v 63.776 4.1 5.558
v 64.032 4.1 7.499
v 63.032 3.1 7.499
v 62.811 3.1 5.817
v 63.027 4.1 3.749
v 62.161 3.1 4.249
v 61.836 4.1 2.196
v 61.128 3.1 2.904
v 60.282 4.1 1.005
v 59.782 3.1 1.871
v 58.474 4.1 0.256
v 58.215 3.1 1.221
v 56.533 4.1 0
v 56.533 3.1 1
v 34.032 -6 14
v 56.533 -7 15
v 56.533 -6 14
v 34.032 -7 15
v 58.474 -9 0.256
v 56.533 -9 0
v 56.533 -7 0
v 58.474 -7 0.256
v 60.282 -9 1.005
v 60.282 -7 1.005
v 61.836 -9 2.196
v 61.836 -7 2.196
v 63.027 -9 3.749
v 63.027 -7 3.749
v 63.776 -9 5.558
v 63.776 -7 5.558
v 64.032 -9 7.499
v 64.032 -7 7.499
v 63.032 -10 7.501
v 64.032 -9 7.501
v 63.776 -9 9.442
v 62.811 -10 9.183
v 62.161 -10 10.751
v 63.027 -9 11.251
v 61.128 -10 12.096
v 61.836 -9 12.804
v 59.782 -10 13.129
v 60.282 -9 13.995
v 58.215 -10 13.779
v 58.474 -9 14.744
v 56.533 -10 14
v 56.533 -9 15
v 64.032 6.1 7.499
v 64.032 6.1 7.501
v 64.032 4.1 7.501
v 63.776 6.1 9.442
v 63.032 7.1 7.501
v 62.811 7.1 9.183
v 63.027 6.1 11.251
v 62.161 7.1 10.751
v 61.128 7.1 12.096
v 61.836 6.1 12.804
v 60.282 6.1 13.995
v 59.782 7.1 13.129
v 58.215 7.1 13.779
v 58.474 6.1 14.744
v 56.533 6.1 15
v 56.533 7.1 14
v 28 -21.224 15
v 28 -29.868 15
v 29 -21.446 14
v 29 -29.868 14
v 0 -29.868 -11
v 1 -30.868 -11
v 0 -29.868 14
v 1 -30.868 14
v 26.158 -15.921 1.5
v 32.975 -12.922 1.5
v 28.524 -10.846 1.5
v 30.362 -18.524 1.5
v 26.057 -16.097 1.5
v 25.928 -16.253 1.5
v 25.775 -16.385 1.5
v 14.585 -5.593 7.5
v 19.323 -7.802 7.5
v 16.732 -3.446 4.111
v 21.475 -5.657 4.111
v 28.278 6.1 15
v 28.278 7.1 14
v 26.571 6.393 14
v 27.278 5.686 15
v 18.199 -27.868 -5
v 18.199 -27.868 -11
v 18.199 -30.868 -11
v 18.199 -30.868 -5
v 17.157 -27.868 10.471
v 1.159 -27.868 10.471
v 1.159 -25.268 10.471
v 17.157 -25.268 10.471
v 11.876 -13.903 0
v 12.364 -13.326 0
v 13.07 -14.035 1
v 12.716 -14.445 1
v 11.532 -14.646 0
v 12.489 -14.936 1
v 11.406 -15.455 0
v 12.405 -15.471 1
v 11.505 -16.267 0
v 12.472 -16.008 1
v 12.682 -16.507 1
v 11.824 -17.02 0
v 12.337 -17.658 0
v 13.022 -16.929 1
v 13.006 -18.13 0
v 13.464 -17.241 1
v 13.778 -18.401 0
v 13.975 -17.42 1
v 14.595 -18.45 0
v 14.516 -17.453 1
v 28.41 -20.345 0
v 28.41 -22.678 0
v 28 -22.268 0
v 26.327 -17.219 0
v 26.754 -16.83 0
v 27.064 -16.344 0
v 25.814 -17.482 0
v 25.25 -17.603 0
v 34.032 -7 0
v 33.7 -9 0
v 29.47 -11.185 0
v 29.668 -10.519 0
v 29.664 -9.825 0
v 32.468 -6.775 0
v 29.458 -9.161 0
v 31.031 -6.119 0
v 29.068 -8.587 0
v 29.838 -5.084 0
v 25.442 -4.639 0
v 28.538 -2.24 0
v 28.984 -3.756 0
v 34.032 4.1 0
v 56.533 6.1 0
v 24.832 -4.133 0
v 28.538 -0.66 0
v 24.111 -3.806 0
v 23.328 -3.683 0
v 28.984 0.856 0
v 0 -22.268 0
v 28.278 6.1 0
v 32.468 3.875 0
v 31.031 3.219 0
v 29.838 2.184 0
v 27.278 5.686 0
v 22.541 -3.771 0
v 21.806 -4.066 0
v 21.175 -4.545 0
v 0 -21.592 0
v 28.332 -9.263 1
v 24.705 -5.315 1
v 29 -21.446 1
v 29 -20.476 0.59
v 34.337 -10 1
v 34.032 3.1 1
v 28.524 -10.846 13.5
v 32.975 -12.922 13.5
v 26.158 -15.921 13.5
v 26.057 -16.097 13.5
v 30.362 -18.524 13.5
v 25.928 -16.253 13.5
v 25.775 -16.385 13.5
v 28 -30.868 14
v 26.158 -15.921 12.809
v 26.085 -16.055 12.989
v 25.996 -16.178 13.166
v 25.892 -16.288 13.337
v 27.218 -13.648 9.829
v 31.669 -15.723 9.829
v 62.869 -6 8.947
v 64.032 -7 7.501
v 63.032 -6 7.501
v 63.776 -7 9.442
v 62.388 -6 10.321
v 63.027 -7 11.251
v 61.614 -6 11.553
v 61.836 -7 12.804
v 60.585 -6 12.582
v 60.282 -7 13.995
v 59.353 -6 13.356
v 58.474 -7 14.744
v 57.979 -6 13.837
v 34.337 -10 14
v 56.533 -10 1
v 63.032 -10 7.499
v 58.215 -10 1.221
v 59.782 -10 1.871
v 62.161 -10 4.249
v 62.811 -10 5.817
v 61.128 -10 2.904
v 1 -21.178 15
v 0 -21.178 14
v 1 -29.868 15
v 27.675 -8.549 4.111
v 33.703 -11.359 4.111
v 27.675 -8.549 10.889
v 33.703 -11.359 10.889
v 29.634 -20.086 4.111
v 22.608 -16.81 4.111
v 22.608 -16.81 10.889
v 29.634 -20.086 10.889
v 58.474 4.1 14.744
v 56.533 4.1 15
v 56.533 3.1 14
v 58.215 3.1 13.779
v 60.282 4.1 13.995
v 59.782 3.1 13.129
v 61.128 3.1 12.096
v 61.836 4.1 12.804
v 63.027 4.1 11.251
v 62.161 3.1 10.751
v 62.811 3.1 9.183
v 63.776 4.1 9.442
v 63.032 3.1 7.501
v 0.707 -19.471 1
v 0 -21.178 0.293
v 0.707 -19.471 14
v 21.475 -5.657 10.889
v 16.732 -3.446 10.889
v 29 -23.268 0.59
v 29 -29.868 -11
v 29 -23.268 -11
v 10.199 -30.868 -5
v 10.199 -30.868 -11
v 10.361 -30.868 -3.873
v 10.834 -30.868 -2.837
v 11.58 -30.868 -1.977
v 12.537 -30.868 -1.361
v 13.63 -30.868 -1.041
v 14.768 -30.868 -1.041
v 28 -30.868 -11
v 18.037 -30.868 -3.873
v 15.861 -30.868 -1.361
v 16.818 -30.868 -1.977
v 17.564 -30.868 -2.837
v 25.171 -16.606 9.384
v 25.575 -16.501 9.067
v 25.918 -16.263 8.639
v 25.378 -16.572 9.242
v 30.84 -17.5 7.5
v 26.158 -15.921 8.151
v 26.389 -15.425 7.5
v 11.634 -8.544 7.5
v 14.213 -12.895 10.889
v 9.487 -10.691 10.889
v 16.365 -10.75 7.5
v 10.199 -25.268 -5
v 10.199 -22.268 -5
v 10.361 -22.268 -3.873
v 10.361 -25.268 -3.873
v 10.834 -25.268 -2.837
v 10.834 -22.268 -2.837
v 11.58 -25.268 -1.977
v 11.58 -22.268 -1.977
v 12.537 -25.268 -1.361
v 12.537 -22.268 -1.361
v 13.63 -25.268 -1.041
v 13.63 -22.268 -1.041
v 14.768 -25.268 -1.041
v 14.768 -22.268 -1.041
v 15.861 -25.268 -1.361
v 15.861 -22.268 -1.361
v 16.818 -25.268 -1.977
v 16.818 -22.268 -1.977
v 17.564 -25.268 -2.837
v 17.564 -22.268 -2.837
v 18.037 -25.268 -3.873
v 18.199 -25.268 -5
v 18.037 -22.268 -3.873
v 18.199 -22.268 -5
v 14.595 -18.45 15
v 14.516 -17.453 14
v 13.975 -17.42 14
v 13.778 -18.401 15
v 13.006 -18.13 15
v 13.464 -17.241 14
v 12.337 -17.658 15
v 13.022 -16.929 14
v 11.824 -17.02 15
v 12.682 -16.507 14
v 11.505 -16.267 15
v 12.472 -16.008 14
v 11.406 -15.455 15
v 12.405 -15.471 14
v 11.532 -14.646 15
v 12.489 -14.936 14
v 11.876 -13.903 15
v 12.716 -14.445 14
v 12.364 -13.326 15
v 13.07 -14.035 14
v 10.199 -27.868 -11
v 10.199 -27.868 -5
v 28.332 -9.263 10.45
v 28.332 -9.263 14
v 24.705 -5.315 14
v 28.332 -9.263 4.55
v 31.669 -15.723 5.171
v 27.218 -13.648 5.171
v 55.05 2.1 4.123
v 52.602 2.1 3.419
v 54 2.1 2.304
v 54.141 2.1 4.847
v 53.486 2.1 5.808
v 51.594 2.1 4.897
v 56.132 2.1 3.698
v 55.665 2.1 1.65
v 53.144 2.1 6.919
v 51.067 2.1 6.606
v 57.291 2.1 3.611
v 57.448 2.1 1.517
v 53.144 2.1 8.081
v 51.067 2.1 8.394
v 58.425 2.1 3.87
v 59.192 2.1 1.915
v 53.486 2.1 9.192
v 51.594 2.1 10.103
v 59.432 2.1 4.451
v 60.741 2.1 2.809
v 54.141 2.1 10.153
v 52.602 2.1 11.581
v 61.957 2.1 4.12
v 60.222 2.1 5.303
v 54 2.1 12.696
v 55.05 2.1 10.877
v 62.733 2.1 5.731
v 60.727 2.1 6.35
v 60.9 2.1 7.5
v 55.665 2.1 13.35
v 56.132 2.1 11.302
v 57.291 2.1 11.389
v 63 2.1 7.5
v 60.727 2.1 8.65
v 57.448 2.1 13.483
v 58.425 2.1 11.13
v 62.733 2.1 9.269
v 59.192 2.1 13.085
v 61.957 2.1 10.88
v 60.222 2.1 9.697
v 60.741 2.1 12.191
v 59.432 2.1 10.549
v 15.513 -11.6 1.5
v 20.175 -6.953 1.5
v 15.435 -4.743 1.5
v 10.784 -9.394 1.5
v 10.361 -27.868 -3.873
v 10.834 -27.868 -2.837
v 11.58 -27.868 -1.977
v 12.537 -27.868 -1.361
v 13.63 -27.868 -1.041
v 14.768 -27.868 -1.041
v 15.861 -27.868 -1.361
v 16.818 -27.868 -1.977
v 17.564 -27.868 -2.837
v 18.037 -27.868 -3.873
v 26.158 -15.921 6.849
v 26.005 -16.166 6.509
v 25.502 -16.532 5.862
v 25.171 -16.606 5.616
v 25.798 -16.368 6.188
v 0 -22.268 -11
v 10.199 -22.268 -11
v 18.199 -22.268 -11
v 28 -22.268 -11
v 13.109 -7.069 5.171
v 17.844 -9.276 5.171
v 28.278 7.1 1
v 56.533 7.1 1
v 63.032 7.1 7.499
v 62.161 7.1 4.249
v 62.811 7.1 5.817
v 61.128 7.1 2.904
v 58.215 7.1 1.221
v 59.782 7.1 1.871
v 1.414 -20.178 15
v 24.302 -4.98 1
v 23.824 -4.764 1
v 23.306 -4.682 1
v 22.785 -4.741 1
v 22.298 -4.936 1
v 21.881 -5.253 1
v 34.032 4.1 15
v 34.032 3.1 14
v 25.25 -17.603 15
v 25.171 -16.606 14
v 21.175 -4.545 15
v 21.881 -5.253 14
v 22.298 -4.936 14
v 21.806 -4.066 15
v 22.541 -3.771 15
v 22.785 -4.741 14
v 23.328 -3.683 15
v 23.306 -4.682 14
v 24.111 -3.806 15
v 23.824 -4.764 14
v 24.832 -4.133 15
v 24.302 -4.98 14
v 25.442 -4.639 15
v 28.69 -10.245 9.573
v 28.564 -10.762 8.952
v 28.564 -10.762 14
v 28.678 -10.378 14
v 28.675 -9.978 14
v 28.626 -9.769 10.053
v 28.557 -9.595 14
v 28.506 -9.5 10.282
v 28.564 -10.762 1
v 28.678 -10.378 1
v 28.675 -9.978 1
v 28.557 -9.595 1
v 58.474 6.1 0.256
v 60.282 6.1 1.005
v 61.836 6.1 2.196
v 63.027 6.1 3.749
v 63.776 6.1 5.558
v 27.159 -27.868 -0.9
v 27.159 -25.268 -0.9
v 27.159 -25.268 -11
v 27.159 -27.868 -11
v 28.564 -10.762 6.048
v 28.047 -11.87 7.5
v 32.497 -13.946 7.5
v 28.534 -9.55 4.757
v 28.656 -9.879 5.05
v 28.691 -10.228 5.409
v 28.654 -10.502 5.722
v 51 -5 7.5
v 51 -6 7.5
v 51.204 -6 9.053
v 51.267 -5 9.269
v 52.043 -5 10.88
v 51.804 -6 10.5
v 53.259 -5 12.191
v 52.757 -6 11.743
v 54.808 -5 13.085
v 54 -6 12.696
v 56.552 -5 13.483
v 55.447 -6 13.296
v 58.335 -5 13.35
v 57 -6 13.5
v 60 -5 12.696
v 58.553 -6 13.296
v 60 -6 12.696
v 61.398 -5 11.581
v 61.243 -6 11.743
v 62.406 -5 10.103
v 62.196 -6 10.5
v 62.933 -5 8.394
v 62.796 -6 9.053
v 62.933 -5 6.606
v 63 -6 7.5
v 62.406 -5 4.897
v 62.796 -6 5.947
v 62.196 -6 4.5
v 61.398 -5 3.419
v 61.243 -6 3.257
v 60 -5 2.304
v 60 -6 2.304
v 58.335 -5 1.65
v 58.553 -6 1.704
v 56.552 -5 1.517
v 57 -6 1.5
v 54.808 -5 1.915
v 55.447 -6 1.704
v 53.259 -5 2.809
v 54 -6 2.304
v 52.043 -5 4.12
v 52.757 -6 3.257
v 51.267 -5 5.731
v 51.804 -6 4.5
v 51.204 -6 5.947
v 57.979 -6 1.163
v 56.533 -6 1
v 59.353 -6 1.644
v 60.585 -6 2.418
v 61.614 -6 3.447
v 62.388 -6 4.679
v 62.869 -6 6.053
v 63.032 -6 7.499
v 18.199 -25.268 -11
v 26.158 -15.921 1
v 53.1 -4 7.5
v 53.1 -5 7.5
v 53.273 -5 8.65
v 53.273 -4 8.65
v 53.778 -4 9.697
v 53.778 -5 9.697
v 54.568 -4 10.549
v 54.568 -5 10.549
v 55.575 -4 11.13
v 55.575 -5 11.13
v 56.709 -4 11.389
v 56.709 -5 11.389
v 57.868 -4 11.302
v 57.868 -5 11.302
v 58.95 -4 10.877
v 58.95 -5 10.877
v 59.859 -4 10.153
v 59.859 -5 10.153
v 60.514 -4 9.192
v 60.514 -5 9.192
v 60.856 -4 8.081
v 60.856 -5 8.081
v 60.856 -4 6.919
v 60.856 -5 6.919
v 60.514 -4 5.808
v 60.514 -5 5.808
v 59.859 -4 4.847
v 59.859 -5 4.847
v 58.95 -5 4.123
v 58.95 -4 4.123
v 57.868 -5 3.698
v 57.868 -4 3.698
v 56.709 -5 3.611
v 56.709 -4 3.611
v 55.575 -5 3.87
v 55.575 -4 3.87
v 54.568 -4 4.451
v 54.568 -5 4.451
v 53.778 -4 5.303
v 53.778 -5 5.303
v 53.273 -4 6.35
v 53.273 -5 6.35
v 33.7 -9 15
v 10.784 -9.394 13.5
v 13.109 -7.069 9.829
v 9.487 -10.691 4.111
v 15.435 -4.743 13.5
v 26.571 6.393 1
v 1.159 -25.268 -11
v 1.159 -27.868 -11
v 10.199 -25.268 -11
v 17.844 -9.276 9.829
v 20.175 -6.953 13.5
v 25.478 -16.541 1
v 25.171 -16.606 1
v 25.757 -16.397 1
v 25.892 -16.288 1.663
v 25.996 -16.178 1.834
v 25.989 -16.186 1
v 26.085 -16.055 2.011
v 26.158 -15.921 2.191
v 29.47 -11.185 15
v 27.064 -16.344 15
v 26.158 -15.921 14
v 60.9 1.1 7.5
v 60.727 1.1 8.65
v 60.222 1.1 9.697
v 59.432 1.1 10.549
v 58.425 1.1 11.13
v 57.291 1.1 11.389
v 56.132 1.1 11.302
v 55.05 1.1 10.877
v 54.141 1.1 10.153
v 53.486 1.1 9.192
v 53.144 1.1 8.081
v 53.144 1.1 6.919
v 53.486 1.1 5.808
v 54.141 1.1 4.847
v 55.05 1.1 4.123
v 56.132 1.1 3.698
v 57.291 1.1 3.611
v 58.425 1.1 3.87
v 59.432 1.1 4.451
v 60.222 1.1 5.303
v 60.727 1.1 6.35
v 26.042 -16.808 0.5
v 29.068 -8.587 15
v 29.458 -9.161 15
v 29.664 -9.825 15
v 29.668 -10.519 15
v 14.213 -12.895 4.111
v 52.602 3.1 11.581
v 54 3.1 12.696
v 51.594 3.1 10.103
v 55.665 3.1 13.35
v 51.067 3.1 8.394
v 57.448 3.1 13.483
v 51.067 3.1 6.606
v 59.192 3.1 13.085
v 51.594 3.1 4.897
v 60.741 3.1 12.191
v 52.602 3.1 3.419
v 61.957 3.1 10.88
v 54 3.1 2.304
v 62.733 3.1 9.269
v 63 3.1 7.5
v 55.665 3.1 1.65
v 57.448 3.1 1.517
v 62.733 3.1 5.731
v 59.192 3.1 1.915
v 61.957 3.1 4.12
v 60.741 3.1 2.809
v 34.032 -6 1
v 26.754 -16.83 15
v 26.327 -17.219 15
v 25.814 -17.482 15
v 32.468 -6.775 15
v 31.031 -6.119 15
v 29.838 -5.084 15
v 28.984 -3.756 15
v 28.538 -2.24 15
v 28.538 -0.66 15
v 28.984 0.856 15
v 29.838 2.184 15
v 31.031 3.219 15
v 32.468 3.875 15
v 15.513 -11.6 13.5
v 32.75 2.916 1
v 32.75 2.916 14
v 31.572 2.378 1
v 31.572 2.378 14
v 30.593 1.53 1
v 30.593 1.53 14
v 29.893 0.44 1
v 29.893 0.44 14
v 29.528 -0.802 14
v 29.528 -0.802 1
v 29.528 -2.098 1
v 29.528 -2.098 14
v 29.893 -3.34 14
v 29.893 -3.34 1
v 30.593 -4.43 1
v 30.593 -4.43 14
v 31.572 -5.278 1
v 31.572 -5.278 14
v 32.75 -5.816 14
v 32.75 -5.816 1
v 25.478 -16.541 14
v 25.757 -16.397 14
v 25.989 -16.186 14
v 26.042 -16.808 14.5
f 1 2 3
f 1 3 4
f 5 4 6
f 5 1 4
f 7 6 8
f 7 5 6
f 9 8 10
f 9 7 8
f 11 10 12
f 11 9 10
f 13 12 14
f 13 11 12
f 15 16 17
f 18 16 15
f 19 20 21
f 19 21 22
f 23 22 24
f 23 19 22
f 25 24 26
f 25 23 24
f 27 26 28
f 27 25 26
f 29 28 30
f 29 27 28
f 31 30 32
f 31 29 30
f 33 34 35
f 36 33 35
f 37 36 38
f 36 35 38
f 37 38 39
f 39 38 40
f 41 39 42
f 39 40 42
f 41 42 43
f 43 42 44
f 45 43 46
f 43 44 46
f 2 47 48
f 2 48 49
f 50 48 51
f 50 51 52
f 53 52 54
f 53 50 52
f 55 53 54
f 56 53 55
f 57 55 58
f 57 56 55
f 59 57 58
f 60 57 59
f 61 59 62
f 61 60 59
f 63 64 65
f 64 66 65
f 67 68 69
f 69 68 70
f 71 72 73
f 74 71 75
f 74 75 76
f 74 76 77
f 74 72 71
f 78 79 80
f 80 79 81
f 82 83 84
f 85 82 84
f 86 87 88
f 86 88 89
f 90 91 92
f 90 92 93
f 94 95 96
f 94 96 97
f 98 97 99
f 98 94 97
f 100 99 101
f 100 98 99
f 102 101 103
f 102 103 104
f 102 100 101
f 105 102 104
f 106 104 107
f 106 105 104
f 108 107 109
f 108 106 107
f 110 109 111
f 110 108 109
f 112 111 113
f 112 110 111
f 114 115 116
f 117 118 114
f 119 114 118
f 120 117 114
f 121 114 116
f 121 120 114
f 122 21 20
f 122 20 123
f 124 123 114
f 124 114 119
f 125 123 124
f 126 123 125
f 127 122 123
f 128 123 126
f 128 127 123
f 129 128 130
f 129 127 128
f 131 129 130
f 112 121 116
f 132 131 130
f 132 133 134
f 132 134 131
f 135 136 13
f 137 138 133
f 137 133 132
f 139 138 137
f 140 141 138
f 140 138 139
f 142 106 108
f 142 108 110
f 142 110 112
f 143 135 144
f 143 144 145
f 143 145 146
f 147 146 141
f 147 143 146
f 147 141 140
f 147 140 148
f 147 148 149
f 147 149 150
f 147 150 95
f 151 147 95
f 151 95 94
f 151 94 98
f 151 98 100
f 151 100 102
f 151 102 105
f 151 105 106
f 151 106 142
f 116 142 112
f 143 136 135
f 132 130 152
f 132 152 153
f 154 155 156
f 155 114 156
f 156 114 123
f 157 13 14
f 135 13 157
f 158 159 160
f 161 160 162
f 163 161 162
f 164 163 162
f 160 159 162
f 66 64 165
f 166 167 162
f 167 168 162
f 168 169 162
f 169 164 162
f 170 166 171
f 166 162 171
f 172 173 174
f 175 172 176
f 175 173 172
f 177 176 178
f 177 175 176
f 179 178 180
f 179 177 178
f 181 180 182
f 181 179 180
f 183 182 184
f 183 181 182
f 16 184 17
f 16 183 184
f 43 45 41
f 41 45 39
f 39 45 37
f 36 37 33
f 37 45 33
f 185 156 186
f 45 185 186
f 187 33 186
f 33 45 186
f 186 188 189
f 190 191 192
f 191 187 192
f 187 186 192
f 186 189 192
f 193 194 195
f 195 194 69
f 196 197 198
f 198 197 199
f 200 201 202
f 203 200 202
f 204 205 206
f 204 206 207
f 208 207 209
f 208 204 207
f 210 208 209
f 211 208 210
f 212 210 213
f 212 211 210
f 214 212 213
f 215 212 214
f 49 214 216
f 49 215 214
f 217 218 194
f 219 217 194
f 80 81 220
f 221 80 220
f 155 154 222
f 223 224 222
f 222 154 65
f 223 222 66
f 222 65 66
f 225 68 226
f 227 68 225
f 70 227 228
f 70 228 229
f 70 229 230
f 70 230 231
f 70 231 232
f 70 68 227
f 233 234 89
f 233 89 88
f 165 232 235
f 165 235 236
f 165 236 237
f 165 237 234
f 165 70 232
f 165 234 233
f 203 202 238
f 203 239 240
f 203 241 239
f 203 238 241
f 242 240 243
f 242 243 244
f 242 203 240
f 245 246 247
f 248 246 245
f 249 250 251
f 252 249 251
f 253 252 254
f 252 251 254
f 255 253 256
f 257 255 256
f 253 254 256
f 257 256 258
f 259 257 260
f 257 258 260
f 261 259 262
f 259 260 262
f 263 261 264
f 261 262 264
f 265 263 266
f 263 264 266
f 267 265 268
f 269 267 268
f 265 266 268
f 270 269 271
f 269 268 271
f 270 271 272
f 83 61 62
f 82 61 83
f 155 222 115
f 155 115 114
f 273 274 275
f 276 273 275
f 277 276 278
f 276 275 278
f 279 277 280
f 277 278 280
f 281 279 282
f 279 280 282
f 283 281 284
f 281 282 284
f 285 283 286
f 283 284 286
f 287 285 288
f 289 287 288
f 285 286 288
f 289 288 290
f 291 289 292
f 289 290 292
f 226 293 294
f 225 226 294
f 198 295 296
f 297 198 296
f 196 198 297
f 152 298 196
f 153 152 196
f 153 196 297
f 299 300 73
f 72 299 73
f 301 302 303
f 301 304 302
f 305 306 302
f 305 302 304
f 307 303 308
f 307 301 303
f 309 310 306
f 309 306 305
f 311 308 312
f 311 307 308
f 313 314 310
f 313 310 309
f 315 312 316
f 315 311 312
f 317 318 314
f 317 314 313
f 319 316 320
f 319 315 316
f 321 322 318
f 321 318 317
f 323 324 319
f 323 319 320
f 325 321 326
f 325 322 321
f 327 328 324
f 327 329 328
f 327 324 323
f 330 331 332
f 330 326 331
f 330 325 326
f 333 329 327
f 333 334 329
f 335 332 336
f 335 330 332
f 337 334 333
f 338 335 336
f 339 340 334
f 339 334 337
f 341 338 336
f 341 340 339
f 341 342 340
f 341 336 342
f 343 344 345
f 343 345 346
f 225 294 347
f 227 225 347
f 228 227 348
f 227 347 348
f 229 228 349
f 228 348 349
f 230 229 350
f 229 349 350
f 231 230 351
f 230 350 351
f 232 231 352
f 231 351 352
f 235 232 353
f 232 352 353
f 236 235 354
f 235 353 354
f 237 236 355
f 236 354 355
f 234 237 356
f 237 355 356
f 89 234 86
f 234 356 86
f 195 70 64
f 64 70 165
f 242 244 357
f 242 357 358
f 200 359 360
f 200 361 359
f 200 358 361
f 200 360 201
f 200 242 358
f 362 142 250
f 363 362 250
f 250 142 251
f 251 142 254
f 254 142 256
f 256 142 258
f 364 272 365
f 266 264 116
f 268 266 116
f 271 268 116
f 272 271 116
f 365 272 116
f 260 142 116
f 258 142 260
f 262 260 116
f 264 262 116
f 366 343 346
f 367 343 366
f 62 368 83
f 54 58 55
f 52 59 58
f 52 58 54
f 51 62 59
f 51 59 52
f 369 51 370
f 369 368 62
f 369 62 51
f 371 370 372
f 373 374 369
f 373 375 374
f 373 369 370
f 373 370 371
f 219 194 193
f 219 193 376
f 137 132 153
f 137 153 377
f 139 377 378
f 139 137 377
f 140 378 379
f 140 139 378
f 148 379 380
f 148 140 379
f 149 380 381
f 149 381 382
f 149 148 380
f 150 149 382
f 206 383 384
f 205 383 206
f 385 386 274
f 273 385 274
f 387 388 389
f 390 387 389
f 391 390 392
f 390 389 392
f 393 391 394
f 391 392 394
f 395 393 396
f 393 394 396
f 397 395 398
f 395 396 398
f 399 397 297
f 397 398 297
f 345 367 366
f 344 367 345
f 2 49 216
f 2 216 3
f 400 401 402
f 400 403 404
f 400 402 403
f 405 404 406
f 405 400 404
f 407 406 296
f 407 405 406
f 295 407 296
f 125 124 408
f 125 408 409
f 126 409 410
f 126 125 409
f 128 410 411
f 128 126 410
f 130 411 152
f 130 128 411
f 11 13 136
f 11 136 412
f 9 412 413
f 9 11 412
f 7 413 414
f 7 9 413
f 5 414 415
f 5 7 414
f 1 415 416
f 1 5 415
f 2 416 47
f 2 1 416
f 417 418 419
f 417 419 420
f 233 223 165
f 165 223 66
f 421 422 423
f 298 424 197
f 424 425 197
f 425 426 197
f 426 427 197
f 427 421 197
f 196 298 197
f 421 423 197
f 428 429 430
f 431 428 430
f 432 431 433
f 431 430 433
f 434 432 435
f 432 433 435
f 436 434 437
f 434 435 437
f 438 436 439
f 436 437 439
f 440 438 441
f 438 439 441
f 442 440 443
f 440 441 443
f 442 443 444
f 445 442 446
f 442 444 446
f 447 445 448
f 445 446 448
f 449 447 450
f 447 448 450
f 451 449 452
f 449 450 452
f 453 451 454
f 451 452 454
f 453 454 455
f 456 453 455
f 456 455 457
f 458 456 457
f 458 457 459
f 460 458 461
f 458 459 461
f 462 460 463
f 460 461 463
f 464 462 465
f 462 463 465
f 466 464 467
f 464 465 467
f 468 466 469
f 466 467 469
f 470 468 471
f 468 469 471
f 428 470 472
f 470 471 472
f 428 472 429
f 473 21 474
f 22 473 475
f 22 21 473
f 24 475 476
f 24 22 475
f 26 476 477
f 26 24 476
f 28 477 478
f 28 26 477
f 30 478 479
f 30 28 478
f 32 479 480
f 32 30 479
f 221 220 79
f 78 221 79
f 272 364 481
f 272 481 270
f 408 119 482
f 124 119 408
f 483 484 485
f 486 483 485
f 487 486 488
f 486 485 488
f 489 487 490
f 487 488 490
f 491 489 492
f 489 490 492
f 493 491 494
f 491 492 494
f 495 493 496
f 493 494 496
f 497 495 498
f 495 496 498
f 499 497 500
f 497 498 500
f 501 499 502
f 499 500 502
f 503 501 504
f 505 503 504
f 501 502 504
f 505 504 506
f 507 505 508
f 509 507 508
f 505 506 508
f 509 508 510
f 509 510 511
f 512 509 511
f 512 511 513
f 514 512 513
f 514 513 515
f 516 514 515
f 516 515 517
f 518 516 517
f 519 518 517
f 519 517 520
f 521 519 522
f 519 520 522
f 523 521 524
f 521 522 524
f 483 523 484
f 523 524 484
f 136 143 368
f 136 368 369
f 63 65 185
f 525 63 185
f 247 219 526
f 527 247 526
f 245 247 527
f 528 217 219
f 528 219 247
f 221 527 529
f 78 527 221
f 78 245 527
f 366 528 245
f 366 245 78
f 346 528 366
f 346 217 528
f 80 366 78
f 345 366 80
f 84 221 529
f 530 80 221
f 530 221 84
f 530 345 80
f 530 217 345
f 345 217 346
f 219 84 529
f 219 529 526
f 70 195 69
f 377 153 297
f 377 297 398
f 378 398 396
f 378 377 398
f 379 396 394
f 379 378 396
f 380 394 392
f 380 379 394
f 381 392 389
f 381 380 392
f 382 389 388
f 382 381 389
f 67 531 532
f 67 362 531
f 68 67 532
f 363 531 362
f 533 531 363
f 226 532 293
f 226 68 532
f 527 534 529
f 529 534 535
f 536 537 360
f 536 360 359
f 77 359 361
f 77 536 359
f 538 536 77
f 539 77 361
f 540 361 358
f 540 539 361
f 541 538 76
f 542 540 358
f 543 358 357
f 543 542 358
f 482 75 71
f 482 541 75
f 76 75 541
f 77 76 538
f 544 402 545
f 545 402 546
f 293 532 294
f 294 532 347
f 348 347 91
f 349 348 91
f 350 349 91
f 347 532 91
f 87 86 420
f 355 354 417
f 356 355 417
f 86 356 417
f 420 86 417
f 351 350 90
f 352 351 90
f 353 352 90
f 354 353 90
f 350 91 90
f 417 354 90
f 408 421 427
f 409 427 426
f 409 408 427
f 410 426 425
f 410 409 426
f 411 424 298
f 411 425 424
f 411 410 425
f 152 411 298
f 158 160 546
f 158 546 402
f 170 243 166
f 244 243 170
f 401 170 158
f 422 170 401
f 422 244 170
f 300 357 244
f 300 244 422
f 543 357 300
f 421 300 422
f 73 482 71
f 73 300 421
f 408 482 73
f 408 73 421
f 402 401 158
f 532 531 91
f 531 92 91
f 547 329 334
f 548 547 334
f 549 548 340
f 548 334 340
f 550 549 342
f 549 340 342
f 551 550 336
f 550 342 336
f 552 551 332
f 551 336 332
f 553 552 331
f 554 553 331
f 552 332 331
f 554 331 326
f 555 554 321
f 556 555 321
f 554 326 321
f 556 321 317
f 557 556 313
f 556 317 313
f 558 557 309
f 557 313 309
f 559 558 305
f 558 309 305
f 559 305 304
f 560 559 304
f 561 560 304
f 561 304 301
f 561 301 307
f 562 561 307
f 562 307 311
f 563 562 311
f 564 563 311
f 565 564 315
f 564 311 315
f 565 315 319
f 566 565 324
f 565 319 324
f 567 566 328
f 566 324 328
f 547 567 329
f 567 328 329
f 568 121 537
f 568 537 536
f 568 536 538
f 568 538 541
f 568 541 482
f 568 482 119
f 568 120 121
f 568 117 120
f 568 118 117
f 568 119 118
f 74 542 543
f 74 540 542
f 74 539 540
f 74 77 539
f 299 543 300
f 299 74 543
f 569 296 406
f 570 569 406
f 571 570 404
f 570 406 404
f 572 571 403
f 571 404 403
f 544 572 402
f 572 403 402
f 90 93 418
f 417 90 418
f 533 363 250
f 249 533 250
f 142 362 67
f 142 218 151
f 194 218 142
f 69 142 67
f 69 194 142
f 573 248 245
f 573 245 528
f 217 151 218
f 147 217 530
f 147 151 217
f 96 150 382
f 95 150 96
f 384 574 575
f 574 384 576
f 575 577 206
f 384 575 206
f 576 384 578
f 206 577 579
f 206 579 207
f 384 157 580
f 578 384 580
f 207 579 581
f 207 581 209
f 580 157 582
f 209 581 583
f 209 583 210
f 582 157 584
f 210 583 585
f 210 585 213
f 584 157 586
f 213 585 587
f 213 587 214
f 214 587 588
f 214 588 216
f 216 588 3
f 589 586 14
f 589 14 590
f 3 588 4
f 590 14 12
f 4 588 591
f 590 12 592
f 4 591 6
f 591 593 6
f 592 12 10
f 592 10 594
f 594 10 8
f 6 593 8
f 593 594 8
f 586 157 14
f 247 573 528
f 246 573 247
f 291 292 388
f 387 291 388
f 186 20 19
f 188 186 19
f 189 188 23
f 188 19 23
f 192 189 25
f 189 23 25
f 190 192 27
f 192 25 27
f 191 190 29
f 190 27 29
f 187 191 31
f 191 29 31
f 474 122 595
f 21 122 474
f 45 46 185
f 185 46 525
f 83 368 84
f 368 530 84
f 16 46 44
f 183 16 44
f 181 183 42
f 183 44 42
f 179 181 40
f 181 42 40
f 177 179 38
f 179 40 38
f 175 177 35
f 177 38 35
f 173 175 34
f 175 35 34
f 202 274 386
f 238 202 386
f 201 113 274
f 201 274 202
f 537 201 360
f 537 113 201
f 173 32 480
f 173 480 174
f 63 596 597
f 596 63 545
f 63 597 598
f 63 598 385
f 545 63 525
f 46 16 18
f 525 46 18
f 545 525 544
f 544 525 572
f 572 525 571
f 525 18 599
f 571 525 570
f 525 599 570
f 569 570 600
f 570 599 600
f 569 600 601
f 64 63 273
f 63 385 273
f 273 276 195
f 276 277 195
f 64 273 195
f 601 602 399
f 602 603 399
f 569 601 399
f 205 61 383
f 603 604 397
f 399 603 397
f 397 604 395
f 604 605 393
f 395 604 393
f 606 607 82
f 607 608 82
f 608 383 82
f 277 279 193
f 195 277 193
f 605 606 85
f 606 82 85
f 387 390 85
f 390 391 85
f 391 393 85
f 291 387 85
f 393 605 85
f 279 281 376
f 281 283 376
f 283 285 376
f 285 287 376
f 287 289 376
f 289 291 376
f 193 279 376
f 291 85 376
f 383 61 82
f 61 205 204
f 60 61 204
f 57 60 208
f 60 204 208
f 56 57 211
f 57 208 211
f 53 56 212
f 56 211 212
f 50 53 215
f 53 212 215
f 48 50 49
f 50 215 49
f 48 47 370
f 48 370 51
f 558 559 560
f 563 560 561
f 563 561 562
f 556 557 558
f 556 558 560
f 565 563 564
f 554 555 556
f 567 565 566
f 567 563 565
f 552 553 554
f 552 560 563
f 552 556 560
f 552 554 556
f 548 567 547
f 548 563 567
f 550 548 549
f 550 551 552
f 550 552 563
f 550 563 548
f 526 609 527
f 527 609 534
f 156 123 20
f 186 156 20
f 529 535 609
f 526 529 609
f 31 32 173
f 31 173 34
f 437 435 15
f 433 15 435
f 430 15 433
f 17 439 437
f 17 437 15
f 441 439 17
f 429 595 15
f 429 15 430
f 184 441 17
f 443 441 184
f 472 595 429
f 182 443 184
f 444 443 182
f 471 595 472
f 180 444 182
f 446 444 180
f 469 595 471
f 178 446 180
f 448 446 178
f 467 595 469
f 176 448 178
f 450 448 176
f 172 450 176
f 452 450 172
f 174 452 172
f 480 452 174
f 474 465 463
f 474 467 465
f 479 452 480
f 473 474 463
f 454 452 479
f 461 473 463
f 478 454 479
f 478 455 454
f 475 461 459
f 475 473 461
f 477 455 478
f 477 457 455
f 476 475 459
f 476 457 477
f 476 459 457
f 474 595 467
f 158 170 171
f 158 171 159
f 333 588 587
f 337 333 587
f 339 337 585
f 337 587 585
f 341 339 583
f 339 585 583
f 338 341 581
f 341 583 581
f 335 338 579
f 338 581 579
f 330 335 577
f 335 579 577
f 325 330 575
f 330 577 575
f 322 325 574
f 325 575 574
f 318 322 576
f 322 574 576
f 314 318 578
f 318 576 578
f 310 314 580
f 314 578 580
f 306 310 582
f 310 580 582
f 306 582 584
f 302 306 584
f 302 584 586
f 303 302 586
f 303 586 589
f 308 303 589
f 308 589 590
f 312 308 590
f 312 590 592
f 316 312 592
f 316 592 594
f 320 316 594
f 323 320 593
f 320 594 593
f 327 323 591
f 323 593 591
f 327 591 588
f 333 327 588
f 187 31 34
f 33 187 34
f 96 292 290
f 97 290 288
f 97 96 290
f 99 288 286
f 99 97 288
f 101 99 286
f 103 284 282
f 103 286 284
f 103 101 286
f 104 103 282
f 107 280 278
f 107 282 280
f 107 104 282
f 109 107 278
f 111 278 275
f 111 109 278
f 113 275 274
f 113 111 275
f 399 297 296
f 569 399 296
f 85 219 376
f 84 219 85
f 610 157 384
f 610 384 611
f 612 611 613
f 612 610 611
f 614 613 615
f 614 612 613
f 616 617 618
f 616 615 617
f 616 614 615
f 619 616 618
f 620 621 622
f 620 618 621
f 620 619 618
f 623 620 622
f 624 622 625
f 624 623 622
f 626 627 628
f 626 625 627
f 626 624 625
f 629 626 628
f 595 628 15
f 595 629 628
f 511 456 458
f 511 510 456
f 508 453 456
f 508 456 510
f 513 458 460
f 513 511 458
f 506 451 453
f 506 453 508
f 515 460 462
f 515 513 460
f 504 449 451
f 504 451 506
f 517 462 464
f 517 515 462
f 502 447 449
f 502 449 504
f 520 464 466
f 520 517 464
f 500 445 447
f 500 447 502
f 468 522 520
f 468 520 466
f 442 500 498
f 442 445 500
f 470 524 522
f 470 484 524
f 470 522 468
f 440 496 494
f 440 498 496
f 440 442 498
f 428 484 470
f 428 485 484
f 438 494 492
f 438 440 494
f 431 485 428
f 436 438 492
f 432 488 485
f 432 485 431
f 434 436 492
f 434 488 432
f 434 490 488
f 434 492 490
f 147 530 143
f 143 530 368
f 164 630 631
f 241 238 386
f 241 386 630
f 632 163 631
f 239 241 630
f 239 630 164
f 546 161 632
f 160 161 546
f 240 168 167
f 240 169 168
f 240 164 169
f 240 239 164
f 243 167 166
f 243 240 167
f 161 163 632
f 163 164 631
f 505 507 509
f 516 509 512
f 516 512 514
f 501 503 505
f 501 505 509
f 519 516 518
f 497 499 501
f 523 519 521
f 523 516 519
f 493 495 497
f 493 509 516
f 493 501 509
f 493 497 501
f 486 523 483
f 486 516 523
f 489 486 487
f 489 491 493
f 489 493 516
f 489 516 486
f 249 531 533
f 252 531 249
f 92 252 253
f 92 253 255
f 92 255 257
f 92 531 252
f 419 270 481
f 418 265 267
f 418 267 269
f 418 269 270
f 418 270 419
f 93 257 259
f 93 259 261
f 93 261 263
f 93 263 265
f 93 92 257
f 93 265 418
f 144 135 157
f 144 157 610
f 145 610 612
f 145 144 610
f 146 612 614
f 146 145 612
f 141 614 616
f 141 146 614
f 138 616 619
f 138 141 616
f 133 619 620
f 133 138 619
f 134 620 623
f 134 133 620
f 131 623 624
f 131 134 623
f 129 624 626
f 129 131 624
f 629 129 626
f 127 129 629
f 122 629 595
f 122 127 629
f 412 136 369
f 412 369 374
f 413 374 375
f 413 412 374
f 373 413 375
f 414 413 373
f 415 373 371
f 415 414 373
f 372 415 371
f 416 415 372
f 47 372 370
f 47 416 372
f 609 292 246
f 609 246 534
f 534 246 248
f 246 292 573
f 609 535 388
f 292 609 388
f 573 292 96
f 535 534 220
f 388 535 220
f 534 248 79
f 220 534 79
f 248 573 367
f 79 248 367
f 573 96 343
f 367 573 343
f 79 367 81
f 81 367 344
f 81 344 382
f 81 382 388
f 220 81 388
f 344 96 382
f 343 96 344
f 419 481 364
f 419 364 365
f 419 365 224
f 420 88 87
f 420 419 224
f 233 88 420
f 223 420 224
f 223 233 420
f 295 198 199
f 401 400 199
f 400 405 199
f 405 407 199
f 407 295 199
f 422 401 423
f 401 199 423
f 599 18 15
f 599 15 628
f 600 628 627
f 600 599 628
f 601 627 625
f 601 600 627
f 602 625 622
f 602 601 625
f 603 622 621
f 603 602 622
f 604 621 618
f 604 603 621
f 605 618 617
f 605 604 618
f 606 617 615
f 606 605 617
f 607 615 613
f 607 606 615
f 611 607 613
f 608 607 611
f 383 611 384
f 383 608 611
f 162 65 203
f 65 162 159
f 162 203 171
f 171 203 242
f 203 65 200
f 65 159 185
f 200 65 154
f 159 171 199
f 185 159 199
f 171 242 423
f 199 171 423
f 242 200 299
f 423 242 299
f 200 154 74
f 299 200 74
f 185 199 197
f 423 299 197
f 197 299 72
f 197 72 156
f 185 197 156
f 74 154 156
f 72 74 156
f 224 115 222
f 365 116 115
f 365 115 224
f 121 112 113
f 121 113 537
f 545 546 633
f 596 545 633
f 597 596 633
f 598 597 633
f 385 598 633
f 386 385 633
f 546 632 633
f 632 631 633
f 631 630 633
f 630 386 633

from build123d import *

# Parameters (mm, degrees)
PAD_DEPTH       = 15
SKETCH003_R     = 6
PAD001_DEPTH    = 1
SKETCH005_R     = 3.9
PAD002_DEPTH    = 1
SKETCH004_R     = 6
PAD003_DEPTH    = 1
SKETCH_R        = 3.9
PAD004_DEPTH    = 1
POCKET_DEPTH    = 15.001
SKETCH012_W     = 29
SKETCH012_H     = 8.6
SKETCH012_W_2   = 26
SKETCH012_H_2   = 2.6
PAD005_DEPTH    = 11
SKETCH013_W     = 26
SKETCH013_H     = 2.6
POCKET001_DEPTH = 21.471
PAD006_DEPTH    = 2.6
POCKET002_DEPTH = 38.3479098694
FILLET_R        = 7.499
POCKET003_DEPTH = 8.601
CHAMFER_SIZE    = 1
CHAMFER001_SIZE = 1
CHAMFER002_SIZE = 0.59


with BuildPart() as part:
    # Sketch001 → Pad (new body)
    with BuildSketch(Plane.XY):
        with BuildLine():
            ThreePointArc((34.031969, 3.1), (29.481969, -1.45), (34.031969, -6))
            Line((34.031969, -6), (64.031969, -6))
            Line((64.031969, -6), (64.031969, -10))
            Line((34.3372726559, -10), (64.031969, -10))
            Line((29, -21.4458181471), (34.3372726559, -10))
            Line((29, -30.8675547205), (29, -21.4458181471))
            Line((0, -30.8675547205), (29, -30.8675547205))
            Line((0, -20.178085), (0, -30.8675547205))
            Line((0, -20.178085), (27.278085, 7.1))
            Line((27.278085, 7.1), (64.031969, 7.1))
            Line((64.031969, 7.1), (64.031969, 3.1))
            Line((34.031969, 3.1), (64.031969, 3.1))
        make_face()
    extrude(amount=PAD_DEPTH)

    # Sketch003 → Pad001 (join)
    with BuildSketch(Plane.XZ.offset(-3.1)):
        with Locations((57, 7.5)):
            Circle(SKETCH003_R)
    extrude(amount=PAD001_DEPTH)

    # Sketch005 (on Face16 of Pad001) → Pad002 (join)
    with BuildSketch(Plane.XZ.offset(-2.1)):
        with Locations((57, 7.5)):
            Circle(SKETCH005_R)
    extrude(amount=PAD002_DEPTH)

    # Sketch004 → Pad003 (join)
    with BuildSketch(Plane(origin=(0, -6, 0), x_dir=(-1, 0, 0), z_dir=(0, 1, 0))):
        with Locations((-57, 7.5)):
            Circle(SKETCH004_R)
    extrude(amount=PAD003_DEPTH)

    # Sketch → Pad004 (join)
    with BuildSketch(Plane(origin=(0, -5, 0), x_dir=(-1, 0, 0), z_dir=(0, 1, 0))):
        with Locations((-57, 7.5)):
            Circle(SKETCH_R)
    extrude(amount=PAD004_DEPTH)

    # Sketch008 → Pocket (cut, through all)
    with BuildSketch(Plane.XY):
        with BuildLine():
            ThreePointArc((13.0697507591, -14.0345267419), (12.559643278, -16.2651404862), (14.5155135985, -17.4527509473))
            Line((14.5155135985, -17.4527509473), (25.1710077735, -16.6064336644))
            ThreePointArc((25.1710077735, -16.6064336644), (25.7569811778, -16.3971334306), (26.15789695, -15.9212784504))
            Line((26.15789695, -15.9212784504), (28.5635079634, -10.7624289841))
            ThreePointArc((28.5635079634, -10.7624289841), (28.6753075146, -9.9775618701), (28.3317651199, -9.2630731374))
            Line((28.3317651199, -9.2630731374), (24.7051920017, -5.3153901784))
            ThreePointArc((24.7051920017, -5.3153901784), (23.3062813222, -4.6824374231), (21.8808496163, -5.2531604134))
            Line((13.0697507591, -14.0345267419), (21.8808496163, -5.2531604134))
        make_face()
    extrude(amount=POCKET_DEPTH, mode=Mode.SUBTRACT)

    # Sketch012 (on Face4 of Pocket) → Pad005 (join)
    with BuildSketch(Plane(origin=(0, 0, 0), x_dir=(1, 0, 0), z_dir=(0, 0, -1))):
        with Locations((14.5, 26.5675547205)):
            Rectangle(SKETCH012_W, SKETCH012_H)
        with Locations((14.159, 26.5675547205)):
            Rectangle(SKETCH012_W_2, SKETCH012_H_2, mode=Mode.SUBTRACT)
    extrude(amount=PAD005_DEPTH)

    # Sketch013 (on Face30 of Pad005) → Pocket001 (cut)
    with BuildSketch(Plane(origin=(0, 0, -11), x_dir=(1, 0, 0), z_dir=(0, 0, -1))):
        with Locations((14.159, 26.5675547205)):
            Rectangle(SKETCH013_W, SKETCH013_H)
    extrude(amount=-POCKET001_DEPTH, mode=Mode.SUBTRACT)

    # Sketch014 (on Face36 of Pocket001) → Pad006 (join)
    with BuildSketch(Plane.XZ.offset(25.2675547205)):
        Polygon((27.159, -0.9), (27.159, 10.471), (17.1566665969, 10.471), align=None)
    extrude(amount=PAD006_DEPTH)

    # Sketch015 (on Face15 of Pad006) → Pocket002 (cut, through all)
    with BuildSketch(Plane(origin=(32.0346452503, -14.9380004065, 0), x_dir=(0.4226182617, 0.906307787, 0), z_dir=(0.906307787, -0.4226182617, 0))):
        Polygon((-5.6805823956, 10.8894220066), (-2.8269007902, 7.5), (-5.6805823956, 4.1105779934), align=None)
        Polygon((-3.9568261963, 13.5), (-0.8660508916, 9.828973136), (2.224724413, 13.5), align=None)
        Polygon((3.9484806124, 10.8894220066), (1.0947990069, 7.5), (3.9484806124, 4.1105779934), align=None)
        Polygon((-0.8660508916, 5.171026864), (2.224724413, 1.5), (-3.9568261963, 1.5), align=None)
    extrude(amount=-POCKET002_DEPTH, mode=Mode.SUBTRACT)

    # Fillet
    fillet_edges = [part.edges().sort_by_distance(p)[0] for p in [
        (64.031969, -8, 15),
        (64.031969, -8, 0),
        (64.031969, 5.1, 0),
        (64.031969, 5.1, 15),
    ]]
    fillet(fillet_edges, radius=FILLET_R)

    # Sketch016 (on Face15 of Fillet) → Pocket003 (cut, through all)
    with BuildSketch(Plane(origin=(0, -22.2675547205, 0), x_dir=(-1, 0, 0), z_dir=(0, 1, 0))):
        with BuildLine():
            Line((-10.199, -11), (-10.199, -5))
            ThreePointArc((-10.199, -5), (-14.199, -1.0000000634), (-18.199, -5))
            Line((-18.199, -11), (-18.199, -5))
            Line((-10.199, -11), (-18.199, -11))
        make_face()
    extrude(amount=-POCKET003_DEPTH, mode=Mode.SUBTRACT)

    # Chamfer
    chamfer_edges = [part.edges().sort_by_distance(p)[0] for p in [
        (17.4753, -9.643844, 15),
        (26.518479, -7.289232, 0),
    ]]
    chamfer(chamfer_edges, length=CHAMFER_SIZE)

    # Chamfer001
    chamfer001_edges = [part.edges().sort_by_distance(p)[0] for p in [
        (13.639043, -6.539043, 0),
        (41.905527, 7.1, 0),
        (45.435121, -10, 0),
        (45.435121, -10, 15),
        (29.481969, -1.45, 0),
        (29.481969, -1.45, 15),
        (41.905527, 7.1, 15),
        (13.639043, -6.539043, 15),
        (27.278085, 7.1, 7.5),
        (0, -20.178085, 7.5),
        (31.668636, -15.722909, 15),
        (29, -26.156686, 15),
        (0, -25.52282, 15),
        (14.5, -30.867555, 15),
        (29, -30.867555, 7.5),
        (0, -30.867555, 7.5),
        (29, -22.267555, -5.5),
        (29, -30.867555, -5.5),
        (31.668636, -15.722909, 0),
    ]]
    chamfer(chamfer001_edges, length=CHAMFER001_SIZE)

    # Chamfer002
    chamfer002_edges = [part.edges().sort_by_distance(p)[0] for p in [
        (29, -21.856686, 0),
    ]]
    chamfer(chamfer002_edges, length=CHAMFER002_SIZE)


solid = part.part
